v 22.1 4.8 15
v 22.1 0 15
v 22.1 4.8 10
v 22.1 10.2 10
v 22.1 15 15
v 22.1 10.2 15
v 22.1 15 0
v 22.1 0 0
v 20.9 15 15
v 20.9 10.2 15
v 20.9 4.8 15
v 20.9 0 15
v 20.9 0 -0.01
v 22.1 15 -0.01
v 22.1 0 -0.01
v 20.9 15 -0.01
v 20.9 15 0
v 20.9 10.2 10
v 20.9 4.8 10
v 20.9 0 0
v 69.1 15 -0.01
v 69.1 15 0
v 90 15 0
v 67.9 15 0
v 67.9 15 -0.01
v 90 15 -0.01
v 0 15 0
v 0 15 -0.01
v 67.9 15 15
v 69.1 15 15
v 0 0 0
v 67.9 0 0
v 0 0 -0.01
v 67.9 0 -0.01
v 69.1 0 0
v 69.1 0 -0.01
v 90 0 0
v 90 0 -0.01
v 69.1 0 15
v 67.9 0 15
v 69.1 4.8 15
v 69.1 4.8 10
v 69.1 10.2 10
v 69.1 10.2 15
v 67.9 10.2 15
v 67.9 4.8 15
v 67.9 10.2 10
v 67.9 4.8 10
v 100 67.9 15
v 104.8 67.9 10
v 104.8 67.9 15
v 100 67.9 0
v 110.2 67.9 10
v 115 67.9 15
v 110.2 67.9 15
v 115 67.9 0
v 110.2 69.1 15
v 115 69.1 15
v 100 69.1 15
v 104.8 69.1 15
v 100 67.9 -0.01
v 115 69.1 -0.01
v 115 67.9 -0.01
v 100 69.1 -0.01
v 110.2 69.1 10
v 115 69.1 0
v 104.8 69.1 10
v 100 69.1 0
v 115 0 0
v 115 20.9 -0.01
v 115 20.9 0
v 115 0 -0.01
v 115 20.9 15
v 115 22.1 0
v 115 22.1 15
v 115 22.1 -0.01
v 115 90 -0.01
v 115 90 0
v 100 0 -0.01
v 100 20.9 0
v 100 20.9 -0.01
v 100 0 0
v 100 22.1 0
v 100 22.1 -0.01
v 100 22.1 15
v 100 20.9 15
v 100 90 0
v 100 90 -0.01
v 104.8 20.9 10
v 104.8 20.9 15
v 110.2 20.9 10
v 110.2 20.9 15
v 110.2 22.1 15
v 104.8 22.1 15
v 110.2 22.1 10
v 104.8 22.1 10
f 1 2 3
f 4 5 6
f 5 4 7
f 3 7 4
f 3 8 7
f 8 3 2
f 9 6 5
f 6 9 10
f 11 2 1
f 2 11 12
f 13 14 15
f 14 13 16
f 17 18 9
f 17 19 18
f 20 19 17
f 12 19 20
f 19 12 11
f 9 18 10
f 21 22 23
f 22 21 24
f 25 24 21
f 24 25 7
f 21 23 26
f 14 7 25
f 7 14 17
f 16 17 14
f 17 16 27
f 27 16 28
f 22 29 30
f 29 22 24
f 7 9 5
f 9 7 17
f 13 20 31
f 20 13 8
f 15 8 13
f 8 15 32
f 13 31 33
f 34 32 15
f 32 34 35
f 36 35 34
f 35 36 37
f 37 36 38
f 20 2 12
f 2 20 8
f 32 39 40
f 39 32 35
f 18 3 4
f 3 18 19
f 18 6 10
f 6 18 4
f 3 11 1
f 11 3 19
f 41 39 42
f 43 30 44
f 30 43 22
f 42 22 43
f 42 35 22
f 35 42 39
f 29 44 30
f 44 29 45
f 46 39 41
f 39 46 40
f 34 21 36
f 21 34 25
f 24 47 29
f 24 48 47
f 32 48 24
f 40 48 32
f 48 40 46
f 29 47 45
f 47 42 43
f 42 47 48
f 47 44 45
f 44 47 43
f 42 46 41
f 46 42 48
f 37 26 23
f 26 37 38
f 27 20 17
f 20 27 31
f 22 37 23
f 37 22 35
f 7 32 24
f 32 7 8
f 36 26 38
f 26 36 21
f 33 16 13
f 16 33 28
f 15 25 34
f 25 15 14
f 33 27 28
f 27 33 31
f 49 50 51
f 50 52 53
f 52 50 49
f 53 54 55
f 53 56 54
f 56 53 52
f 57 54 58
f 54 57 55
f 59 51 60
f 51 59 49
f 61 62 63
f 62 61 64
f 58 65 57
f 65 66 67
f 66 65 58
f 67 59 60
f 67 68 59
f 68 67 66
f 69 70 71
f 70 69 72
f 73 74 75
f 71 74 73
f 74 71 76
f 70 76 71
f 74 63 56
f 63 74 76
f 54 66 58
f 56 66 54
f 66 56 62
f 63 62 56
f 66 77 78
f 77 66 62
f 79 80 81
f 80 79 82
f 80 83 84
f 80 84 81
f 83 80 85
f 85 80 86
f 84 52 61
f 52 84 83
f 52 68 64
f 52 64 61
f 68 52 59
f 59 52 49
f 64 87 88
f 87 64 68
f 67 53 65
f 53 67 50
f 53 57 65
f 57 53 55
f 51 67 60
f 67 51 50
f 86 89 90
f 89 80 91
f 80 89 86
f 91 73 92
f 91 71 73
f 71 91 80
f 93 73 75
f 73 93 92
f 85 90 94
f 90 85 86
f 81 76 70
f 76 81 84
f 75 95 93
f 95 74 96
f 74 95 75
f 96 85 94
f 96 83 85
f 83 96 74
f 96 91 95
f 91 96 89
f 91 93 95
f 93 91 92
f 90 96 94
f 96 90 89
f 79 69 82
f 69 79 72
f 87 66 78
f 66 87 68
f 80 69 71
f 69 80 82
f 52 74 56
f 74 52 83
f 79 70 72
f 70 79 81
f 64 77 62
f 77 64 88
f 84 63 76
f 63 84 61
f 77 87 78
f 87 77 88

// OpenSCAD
// file: ../../Base/Boxes.scad
// Fischertechnik Box Foundation
// Pre-designed Boxes

use <Constants.scad>

include <PlacementOptions.scad>

box190Width = 190;
box190Depth = 130;
box130Width = 130;
box130Depth = 95;
boxUsageHeight = 33.9;
boxWallThickness = 2.4;
boxBaseThickness = 1.0;

// getBoxWallThickness()
// Gets the wall thickness of a Fischertechnik Box

function getBoxWallThickness() = boxWallThickness;

// Gets the usable height of a fischertechnik box
function getBoxUsageHeight() = boxUsageHeight;

// Gets the thickness of the Fischertechnik box base.
function getBoxBaseThickness() = boxBaseThickness;

// Gets the usable inner space of a Box 190 as an x/y-list
function getBox190Space() = [
    box190Width - 2*getBoxWallThickness(), 
    box190Depth - 2*getBoxWallThickness() ];

// Imports the Fischertechnik empty box 130x190 mm and places it at position 0,0
// 190x130 are the outer sizes, the inner space is slightly smaller. Use getBox190Space() to get the inner sizes.
// This module needs the STL file "Fischertechnik Box 130x190.stl" in the library path.
// The box is positioned that the usable inner space is at the 0,0,0 position. The

module Box190() {
    translate([-getBoxWallThickness(),-getBoxWallThickness(),-getBoxBaseThickness()])
        import("Fischertechnik Box 130x190.stl", convexity=3);
}

// Gets the usable inner space of a Box 130 as an x/y-list
function getBox130Space() = [
    box130Width - 2*getBoxWallThickness(), 
    box130Depth - 2*getBoxWallThickness() ];

// Imports the Fischertechnik empty box 95x130 mm and places it at position 0,0
// 190x130 are the outer sizes, the inner space is slightly smaller. Use getBox190Space() to get the inner sizes.
// This module needs the STL file "Fischertechnik Box 95x130.stl" in the library path.
// The box is positioned that the usable inner space is at the 0,0,0 position. The

module Box130() {
    translate([-getBoxWallThickness(),-getBoxWallThickness(),-getBoxBaseThickness()])
        import("Fischertechnik Box 95x130.stl", convexity=3);
}

// Creates a web at the specified box walls
// corner 0 = LowerLeft, 1 = UpperLeft, 2 = UpperRight, 3 = LowerRight
// side 0 = LeftOfCorner, 1 = RightOfCorner
// distance = Distance in mm from the corner
// box = inner width and depth of the box (default: Box 190)
// webWidth = length of the web (default is 3 mms)
// webThickness = thickness of the web (default is 1 mm)

module BoxWeb(corner, side, distance, box=getBox190Space(), webWidth=3, webThickness=1.0) {
    sink = getBoxWallThickness()/2;

    width = (corner % 2 == 0) ? 
            (side == LeftOfCorner ? webWidth : webThickness) :
            (side == LeftOfCorner ? webThickness : webWidth);

    depth = (corner % 2 == 0) ? 
            (side == RightOfCorner ? webWidth : webThickness) :
            (side == RightOfCorner ? webThickness : webWidth);
    
    xDiff = corner == LowerLeft ? 
                (side == LeftOfCorner ? -sink : distance) :
            (corner == UpperLeft ?                
                (side == LeftOfCorner ? distance : -sink) :
            (corner == UpperRight ?
                (side == LeftOfCorner ? box.x-webWidth+sink : box.x-distance-webThickness) :
                (side == LeftOfCorner ? box.x-distance-webThickness: box.x-webWidth+sink)));

    yDiff = corner == LowerLeft ? 
                (side == RightOfCorner ? -sink : distance) :
            (corner == UpperLeft ?
                (side == RightOfCorner ? box.y-distance : box.y-webWidth+sink) :
            (corner == UpperRight ?
                (side == RightOfCorner ? box.y-webWidth+sink : box.y-distance) :
                (side == RightOfCorner ? distance : -sink)));
    
    translate([xDiff, yDiff, -getExcess()])
        cube([width, depth, boxUsageHeight + 2*getExcess()]);
}
// file: ../../Base/Rotation.scad
// Fischertechnik Box Foundation
// Geometry Helpers Rotation

include <PlacementOptions.scad>

// getRotatedSpace(space, rotation=NoRotation)
// Rotates the space dependent on the specified rotation

function getRotatedSpace(space, rotation=NoRotation) = [
    (rotation == Rotate90 || rotation == Rotate270) ? space.y : space.x,
    (rotation == Rotate90 || rotation == Rotate270) ? space.x : space.y
];

// Rotates the given space around the fixed left lower corner
// space = the space the children needs as width/depth list [width,depth]
// rotation = 0 Rotate0 degrees, 1 Rotate90 degrees, 2 Rotate180 degrees, 3 Rotate270 degrees (equivalent to -90)

module RotateFix(space, rotation=Rotate0) {
    dy = (rotation == Rotate0 || rotation == Rotate270) ? 0 :
        (rotation == Rotate90) ? space.x :
        space.y;
    dx = (rotation < Rotate180) ? 0 :
        (rotation == Rotate180) ? space.x :
        space.y;
    
    translate([dx, dy, 0])
        rotate([0, 0, rotations[rotation]])
            children();
}
// file: ../../Base/Alignment.scad
// Fischertechnik Box Foundation
// Geometry Helpers Alignment

include <PlacementOptions.scad>

// getAlignedX(elementWidth, spaceWidth, align=AlignRight, offset=0)
// Gets the aligned X offset of an element with the given
// width in the given space.
// elementWidth = The width of the element to positon
// spaceWidth = The space where the element should be aligned
// align = 0 AlignLeft, 1 AlignCenter, 2 AlignRight
// offset = an optional offset from the aligned position. When
// aligned left or centered, then positive values are in X direction.
// When aligned right then positive values are in negative X direction.

function getAlignedX(elementWidth, spaceWidth, align=AlignRight, offset=0) =
    (align == AlignLeft) ?
        offset :
        ((align == AlignCenter) ?
        (spaceWidth - elementWidth)/2 + offset :
        spaceWidth - offset - elementWidth);

// getAlignedY(elementDepth, spaceDepth, align=AlignTop, offset=0)
// Gets the aligned Y offset of an element with the given
// depth in the given space.
// elementDepth = The depth of the element to positon
// spaceDepth = The space where the element should be aligned
// align = 0 AlignBottom, 1 AlignCenter, 2 AlignTop
// offset = an optional offset from the aligned position. When
// aligned bottom or centered, then positive values are in Y direction.
// When aligned top then positive values are in negative Y direction.

function getAlignedY(elementDepth, spaceDepth, align=AlignTop, offset=0) =
    (align == AlignBottom) ?
        offset :
        ((align == AlignCenter) ?
        (spaceDepth - elementDepth)/2 + offset :
        spaceDepth - offset - elementDepth);
// file: ../../Base/Constants.scad
// Fischertechnik Box Foundation
// Constants

// Constant values necessary for multiple elements

// Base constants
dividerThickness = 1.2;
excess = 0.01;
fragments = 90;
tolerance = 0.8;

// Gets the thickness of a divider 
function getDividerThickness() = dividerThickness;

// Gets the excess that is used to merge walls into each other
function getExcess() = excess;

// Gets amount of fragments of a cylinder
function getFragments() = fragments;

// Gets the inner tolerance of a frame to each side
function getTolerance() = tolerance;


// Fischertechnik specific constants
axisDiameter = 4;
axisBottomDiameter = axisDiameter + 1;
standardEdgeDistance = 2.5;
standardWebDistance = 11.5;
standardCornerLength = 15;
tubeWallFactor = 1.6;

// Gets axis diameter
function getAxisDiameter() = axisDiameter;

// Gets axis bottom diameter for thicker part at the bottom
function getAxisBottomDiameter() = axisBottomDiameter;

// gets the standard distance to the wall of the box for dockable frames with webs
function getStandardEdgeDistance() = standardEdgeDistance;

// gets the standard distance of each web to the corner of the dockable frame
function getStandardWebDistance() = standardWebDistance;

// gets the standard length of the corner walls of a dockable frame
function getStandardCornerLength() = standardCornerLength;

// gets the wall thickness of a tube.
function getTubeWallThickness() = tubeWallFactor * getDividerThickness();
// file: ../../Base/PlacementOptions.scad
// Fischertechnik Box Foundation
// Placement Options

// Alignment
NoAlign = 0;
AlignLeft = 1;
AlignBottom = 2;
AlignCenter = 3;
AlignRight = 4;
AlignTop = 5;

// Element rotation degree steps
rotations = [0, -90, -180, -270];

// Rotation
NoRotation = 0;
Rotate0 = 0;
Rotate90 = 1;
Rotate180 = 2;
Rotate270 = 3;

// Docking (seen from above)
NoDock = -1;
DockLeft = 0;
DockTop = 1;
DockRight = 2;
DockCorner = 2;
DockBottom = 3;

// Web corners
LowerLeft = 0;
UpperLeft = 1;
UpperRight = 2;
LowerRight = 3;

// Web position relative to corner
LeftOfCorner = 0;
RightOfCorner = 1;
// file: ../../Elements/HolderLinkBeam.scad
// Fischertechnik Box Library
// Holder for Link Beam
// 38418

use <../Base/Constants.scad>
use <../ModelBase/Simple.scad>

width = 90;
depth = 15;

// getHolderLinkBeamSpace()
// Gets the width and depth of the space the lonk beam holder needs.
function getHolderLinkBeamSpace() = [width, depth];

// HolderLinkBeam()
// Holder for a Link Beam

module HolderLinkBeam() {
    height = 15 + getExcess();
    distance = 45 + getTolerance();
    cutoffDepth = 5.4;
    cutoffHeight = 5;
    
    module Holder(xOffset) {
        midOffset = (depth - cutoffDepth) / 2;
        
        translate([xOffset, 0, -getExcess()]) {
            difference() {
                cube([getDividerThickness(), depth, height]);
                translate([-getExcess()/2, midOffset, height - cutoffHeight])
                    cube([getDividerThickness()*2, cutoffDepth, cutoffHeight + getExcess()]);
            }
        }
    }

    Space([width, depth, height]);
    
    xOffsetLeft = (width - distance) / 2 - getDividerThickness();
    Holder(xOffsetLeft);

    xOffsetRight = width - xOffsetLeft - getDividerThickness();
    Holder(xOffsetRight);
}

// Test
color("lightgray")
HolderLinkBeam();
// file: ../../Base/Placement.scad
// Fischertechnik Box Foundation
// Geometry Helpers Placement

use <Constants.scad>
use <Alignment.scad>
use <Rotation.scad>
use <Boxes.scad>

include <PlacementOptions.scad>

// Place(x=0, y=0, elementSpace=[0,0], alignX=AlignLeft, alignY=AlignBottom, rotation=Rotate0, boxSpace=getBox190Space())
// Places the child at the specified position
// y = Y-Position. This is a relative position when an X aligment is specified.
// x = X-Position. This is a relative position when an Y aligment is specified.
// elementSpace = space of the element to be placed [x,y]
// alignX = -1=NoAlign, 0 AlignLeft, 1 AlignCenter, 3 AlignRight (elementSpace and boxSpace required!)
// alignY = -1=NoAlign, 2 AlignBottom, 1 AlignCenter, 4 AlignTop (elementSpace and boxSpace required!)
// rotation = 0 Rotate0 0 degrees, 1 Rotate90 90 degrees, 
// 2 Rotate180 180 degrees, 3 Rotate270 270 degrees (equivalent to -90)
// boxSpace = Inner space of the box where the placement occurs [x,y] - default is Box 190x130 inner space

module Place(x=0, y=0, elementSpace=[0,0], 
  alignX=AlignLeft, alignY=AlignBottom, 
  rotation=NoRotation, boxSpace=getBox190Space()) {

    module Position(x, y, space, rotation=Rotate0) {
        translate([x, y, 0])
            RotateFix(space, rotation)
                children(0);
    }

    space = getRotatedSpace(elementSpace, rotation);
    alignedX = getAlignedX(space.x, boxSpace.x, alignX, x);
    alignedY = getAlignedY(space.y, boxSpace.y, alignY, y);
    Position(alignedX, alignedY, elementSpace, rotation)
        children(0);
}

// Center(space=getBox130Space(), elementSpace=[0,0])
// space = Space where the children is centered. For cylinder use centered=true and no elementSpace.
// elementSpace = space of the element to be centered [x,y]

module Center(space=getBox190Space(), elementSpace=[0,0]) {
    translate([(space.x - elementSpace.x) / 2, (space.y - elementSpace.y) / 2])
        children(0);
}

// CenterHorizontal(width=0, y=0, offset=0, space=getBox130Space())
// space = Space where the children is centered. For cylinder use centered=true and no elementSpace.
// elementSpace = space of the element to be centered [x,y]

module CenterHorizontal(width=0, y=0, offset=0, space=getBox190Space()) {
    translate([(space.x - width) / 2 + offset, y])
        children(0);
}

// CenterVertical(depth=0, x=0, offset=0, space=getBox130Space())
// space = Space where the children is centered. For cylinder use centered=true and no elementSpace.
// elementSpace = space of the element to be centered [x,y]

module CenterVerticalal(depth=0, x=0, offset=0, space=getBox190Space()) {
    translate([x, (space.y - depth) / 2 + offset])
        children(0);
}
// main file
// Fischertechnik Box Foundation
// Elements
// Test HolderLinkBeam

use <../../Base/Placement.scad>
use <../../Elements/HolderLinkBeam.scad>

include <../../Base/PlacementOptions.scad>

HolderLinkBeam();

Place(100, 0, elementSpace=getHolderLinkBeamSpace(), rotation=Rotate90)
    HolderLinkBeam();
